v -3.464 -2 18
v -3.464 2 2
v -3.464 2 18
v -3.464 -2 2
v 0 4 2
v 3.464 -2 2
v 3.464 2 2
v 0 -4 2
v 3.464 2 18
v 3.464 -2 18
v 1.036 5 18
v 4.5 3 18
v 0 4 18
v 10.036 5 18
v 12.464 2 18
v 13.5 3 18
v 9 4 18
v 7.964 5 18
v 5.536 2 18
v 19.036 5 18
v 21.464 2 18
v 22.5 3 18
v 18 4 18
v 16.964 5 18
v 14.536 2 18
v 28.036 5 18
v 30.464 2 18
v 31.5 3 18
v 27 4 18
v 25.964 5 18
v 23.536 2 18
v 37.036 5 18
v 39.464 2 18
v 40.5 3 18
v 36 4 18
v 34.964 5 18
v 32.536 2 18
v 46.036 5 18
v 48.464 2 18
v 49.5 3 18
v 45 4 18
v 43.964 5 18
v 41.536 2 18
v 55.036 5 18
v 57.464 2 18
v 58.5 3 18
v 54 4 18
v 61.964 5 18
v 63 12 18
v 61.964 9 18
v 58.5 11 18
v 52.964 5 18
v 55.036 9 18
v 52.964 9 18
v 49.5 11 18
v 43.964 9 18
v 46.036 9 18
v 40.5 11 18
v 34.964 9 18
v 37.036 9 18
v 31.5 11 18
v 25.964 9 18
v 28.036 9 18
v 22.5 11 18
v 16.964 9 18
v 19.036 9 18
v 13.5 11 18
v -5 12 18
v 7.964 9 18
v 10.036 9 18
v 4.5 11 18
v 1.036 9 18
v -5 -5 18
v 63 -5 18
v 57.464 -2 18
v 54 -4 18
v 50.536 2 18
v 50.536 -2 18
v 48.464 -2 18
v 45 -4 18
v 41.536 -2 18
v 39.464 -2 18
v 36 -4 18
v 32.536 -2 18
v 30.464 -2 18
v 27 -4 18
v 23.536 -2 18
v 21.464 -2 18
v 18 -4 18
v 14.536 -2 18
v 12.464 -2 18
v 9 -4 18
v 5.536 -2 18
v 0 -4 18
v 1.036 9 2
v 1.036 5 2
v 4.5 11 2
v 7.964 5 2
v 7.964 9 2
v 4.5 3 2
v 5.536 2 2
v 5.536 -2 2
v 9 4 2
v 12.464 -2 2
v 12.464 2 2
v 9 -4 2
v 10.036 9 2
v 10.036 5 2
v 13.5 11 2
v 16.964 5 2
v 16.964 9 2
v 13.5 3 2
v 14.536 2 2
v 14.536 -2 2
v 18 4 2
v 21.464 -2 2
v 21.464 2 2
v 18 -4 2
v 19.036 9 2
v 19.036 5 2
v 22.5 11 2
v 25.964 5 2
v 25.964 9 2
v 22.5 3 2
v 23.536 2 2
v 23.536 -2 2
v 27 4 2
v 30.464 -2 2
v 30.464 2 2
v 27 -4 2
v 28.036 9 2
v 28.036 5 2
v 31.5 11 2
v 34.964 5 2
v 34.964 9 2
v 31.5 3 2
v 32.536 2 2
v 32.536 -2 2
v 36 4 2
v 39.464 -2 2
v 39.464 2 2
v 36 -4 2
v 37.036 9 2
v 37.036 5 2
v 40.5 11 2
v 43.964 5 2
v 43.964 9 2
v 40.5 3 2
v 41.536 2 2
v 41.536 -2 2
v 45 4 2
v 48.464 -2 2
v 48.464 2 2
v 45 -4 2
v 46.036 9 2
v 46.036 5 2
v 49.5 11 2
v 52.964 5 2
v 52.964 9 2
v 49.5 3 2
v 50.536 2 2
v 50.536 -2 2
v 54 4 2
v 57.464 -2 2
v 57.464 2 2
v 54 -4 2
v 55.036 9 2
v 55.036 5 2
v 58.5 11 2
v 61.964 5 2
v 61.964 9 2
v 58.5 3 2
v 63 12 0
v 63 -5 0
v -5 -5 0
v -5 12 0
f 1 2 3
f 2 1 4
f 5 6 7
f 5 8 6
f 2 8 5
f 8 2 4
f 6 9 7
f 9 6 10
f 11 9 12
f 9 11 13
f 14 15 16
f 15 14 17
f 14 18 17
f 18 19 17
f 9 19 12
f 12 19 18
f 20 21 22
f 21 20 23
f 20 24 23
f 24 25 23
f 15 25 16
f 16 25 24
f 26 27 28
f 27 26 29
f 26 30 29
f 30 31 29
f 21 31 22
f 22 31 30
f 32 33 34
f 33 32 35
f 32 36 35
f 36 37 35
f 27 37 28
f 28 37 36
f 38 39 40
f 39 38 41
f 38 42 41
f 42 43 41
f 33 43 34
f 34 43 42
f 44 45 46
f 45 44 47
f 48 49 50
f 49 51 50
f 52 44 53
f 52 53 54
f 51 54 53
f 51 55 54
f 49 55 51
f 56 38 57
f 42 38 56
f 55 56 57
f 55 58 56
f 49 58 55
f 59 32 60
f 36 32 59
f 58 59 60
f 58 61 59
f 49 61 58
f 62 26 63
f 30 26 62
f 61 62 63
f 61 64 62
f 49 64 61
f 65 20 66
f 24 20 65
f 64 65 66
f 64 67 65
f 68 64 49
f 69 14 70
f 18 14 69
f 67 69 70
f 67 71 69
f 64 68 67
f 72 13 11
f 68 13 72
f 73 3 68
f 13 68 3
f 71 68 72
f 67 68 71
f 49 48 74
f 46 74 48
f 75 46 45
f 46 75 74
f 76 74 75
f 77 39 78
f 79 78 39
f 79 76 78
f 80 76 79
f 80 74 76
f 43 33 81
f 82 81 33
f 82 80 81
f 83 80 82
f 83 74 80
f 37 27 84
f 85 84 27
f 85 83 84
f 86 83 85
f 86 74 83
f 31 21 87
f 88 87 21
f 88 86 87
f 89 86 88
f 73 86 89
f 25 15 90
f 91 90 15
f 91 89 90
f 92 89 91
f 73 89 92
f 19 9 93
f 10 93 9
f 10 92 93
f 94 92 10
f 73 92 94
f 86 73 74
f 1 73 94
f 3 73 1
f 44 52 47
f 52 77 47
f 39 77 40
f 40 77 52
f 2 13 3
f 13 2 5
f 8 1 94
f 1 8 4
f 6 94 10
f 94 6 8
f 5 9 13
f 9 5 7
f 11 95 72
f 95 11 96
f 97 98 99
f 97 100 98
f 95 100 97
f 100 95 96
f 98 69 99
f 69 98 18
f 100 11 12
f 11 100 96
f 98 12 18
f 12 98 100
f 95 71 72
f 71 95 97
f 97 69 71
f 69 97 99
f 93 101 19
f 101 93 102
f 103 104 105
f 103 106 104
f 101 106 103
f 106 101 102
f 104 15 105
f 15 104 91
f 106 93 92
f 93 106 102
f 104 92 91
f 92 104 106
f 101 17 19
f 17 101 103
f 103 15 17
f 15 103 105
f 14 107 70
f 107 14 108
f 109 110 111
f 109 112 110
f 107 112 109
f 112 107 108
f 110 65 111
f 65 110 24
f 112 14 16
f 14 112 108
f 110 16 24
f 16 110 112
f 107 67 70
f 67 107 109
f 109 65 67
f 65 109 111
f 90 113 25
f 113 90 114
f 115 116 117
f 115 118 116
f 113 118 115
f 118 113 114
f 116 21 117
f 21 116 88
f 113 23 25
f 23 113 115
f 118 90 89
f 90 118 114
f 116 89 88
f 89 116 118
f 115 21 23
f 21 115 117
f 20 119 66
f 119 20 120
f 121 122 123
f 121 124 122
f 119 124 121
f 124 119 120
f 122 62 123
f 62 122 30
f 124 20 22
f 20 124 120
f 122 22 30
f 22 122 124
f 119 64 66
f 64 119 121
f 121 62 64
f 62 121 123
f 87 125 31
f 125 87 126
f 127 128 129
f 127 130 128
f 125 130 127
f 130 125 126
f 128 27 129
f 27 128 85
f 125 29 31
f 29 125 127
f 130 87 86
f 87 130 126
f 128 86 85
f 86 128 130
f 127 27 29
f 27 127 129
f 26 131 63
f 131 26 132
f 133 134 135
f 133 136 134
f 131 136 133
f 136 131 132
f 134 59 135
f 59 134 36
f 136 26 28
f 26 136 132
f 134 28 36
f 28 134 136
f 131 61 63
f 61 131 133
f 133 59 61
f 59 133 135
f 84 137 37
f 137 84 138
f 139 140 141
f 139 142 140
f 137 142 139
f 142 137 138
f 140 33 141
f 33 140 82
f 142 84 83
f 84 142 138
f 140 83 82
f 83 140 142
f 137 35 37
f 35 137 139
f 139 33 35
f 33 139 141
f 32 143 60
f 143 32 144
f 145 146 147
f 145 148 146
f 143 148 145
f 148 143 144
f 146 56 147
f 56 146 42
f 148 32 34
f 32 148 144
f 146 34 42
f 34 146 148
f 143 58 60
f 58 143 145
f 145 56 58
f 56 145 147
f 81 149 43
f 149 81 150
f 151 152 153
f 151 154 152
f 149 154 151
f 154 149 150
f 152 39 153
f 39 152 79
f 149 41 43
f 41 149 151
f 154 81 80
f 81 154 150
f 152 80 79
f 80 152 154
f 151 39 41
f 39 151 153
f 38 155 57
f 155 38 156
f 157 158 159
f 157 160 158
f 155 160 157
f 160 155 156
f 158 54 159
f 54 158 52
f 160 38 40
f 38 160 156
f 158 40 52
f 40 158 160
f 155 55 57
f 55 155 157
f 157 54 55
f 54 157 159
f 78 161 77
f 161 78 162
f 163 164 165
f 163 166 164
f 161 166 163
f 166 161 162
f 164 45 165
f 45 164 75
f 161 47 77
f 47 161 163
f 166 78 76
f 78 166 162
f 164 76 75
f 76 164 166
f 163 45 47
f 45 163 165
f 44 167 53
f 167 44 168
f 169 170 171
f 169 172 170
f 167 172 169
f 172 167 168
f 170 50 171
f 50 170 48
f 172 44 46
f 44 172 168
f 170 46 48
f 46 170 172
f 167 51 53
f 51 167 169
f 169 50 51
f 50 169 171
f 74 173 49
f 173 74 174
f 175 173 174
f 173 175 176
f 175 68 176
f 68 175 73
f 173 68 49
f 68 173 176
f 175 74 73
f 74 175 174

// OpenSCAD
$fn=50;

module hexnut(d, h) {
    // d is point to point, not flat side to flat side.
    // a hex of radius d is inscribed inside a circle of radius d.
    r=d/2;
    points = [
        [r, 0],
        [r * cos(60), r * sin(60)],
        [r * cos(120), r * sin(120)],
        [r * cos(180), r * sin(180)],
        [r * cos(240), r * sin(240)],
        [r * cos(300), r * sin(300)]
    ];
    p=[[0,1,2,3,4,5]];
    linear_extrude(height=h) polygon(points=points, paths=p);
}

module normcube(c) {
    // normalize a cube to be positioned around the origin, like a cylinder.
    translate([-c.x/2,-c.y/2,0]) cube(c);
}

module old_hexholder() {
    HH=16;
    FLOOR=2;
    DX=9;
    DY=7;
    difference() {
        translate([-5,-5,0]) cube([50,24,HH]);
        for (i=[0:4]) {
            for (j=[0:2]) {
                #translate([i*DX+(j%2*DX/2),j*DY,FLOOR]) rotate([0,0,30]) hexnut(8.0,HH-FLOOR);
            }
        }
    }
}
module hexholder(nrows, ncols,height) {
    // hex bits all seem to be the same?
    HEXBIT_SIZE=8.0;
    FLOOR=2;
    DX=9;
    DY=7;
    difference() {
        translate([-5,-5,0]) cube([nrows*10-2,ncols*10-3,height]);
        for (i=[0:nrows-1]) {
            for (j=[0:ncols-1]) {
                translate([i*DX+(j%2*DX/2),j*DY,FLOOR]) {
                    #rotate([0,0,30]) hexnut(HEXBIT_SIZE,height-FLOOR);
                }
            }
        }
    }
}

hexholder(7,2,18);
